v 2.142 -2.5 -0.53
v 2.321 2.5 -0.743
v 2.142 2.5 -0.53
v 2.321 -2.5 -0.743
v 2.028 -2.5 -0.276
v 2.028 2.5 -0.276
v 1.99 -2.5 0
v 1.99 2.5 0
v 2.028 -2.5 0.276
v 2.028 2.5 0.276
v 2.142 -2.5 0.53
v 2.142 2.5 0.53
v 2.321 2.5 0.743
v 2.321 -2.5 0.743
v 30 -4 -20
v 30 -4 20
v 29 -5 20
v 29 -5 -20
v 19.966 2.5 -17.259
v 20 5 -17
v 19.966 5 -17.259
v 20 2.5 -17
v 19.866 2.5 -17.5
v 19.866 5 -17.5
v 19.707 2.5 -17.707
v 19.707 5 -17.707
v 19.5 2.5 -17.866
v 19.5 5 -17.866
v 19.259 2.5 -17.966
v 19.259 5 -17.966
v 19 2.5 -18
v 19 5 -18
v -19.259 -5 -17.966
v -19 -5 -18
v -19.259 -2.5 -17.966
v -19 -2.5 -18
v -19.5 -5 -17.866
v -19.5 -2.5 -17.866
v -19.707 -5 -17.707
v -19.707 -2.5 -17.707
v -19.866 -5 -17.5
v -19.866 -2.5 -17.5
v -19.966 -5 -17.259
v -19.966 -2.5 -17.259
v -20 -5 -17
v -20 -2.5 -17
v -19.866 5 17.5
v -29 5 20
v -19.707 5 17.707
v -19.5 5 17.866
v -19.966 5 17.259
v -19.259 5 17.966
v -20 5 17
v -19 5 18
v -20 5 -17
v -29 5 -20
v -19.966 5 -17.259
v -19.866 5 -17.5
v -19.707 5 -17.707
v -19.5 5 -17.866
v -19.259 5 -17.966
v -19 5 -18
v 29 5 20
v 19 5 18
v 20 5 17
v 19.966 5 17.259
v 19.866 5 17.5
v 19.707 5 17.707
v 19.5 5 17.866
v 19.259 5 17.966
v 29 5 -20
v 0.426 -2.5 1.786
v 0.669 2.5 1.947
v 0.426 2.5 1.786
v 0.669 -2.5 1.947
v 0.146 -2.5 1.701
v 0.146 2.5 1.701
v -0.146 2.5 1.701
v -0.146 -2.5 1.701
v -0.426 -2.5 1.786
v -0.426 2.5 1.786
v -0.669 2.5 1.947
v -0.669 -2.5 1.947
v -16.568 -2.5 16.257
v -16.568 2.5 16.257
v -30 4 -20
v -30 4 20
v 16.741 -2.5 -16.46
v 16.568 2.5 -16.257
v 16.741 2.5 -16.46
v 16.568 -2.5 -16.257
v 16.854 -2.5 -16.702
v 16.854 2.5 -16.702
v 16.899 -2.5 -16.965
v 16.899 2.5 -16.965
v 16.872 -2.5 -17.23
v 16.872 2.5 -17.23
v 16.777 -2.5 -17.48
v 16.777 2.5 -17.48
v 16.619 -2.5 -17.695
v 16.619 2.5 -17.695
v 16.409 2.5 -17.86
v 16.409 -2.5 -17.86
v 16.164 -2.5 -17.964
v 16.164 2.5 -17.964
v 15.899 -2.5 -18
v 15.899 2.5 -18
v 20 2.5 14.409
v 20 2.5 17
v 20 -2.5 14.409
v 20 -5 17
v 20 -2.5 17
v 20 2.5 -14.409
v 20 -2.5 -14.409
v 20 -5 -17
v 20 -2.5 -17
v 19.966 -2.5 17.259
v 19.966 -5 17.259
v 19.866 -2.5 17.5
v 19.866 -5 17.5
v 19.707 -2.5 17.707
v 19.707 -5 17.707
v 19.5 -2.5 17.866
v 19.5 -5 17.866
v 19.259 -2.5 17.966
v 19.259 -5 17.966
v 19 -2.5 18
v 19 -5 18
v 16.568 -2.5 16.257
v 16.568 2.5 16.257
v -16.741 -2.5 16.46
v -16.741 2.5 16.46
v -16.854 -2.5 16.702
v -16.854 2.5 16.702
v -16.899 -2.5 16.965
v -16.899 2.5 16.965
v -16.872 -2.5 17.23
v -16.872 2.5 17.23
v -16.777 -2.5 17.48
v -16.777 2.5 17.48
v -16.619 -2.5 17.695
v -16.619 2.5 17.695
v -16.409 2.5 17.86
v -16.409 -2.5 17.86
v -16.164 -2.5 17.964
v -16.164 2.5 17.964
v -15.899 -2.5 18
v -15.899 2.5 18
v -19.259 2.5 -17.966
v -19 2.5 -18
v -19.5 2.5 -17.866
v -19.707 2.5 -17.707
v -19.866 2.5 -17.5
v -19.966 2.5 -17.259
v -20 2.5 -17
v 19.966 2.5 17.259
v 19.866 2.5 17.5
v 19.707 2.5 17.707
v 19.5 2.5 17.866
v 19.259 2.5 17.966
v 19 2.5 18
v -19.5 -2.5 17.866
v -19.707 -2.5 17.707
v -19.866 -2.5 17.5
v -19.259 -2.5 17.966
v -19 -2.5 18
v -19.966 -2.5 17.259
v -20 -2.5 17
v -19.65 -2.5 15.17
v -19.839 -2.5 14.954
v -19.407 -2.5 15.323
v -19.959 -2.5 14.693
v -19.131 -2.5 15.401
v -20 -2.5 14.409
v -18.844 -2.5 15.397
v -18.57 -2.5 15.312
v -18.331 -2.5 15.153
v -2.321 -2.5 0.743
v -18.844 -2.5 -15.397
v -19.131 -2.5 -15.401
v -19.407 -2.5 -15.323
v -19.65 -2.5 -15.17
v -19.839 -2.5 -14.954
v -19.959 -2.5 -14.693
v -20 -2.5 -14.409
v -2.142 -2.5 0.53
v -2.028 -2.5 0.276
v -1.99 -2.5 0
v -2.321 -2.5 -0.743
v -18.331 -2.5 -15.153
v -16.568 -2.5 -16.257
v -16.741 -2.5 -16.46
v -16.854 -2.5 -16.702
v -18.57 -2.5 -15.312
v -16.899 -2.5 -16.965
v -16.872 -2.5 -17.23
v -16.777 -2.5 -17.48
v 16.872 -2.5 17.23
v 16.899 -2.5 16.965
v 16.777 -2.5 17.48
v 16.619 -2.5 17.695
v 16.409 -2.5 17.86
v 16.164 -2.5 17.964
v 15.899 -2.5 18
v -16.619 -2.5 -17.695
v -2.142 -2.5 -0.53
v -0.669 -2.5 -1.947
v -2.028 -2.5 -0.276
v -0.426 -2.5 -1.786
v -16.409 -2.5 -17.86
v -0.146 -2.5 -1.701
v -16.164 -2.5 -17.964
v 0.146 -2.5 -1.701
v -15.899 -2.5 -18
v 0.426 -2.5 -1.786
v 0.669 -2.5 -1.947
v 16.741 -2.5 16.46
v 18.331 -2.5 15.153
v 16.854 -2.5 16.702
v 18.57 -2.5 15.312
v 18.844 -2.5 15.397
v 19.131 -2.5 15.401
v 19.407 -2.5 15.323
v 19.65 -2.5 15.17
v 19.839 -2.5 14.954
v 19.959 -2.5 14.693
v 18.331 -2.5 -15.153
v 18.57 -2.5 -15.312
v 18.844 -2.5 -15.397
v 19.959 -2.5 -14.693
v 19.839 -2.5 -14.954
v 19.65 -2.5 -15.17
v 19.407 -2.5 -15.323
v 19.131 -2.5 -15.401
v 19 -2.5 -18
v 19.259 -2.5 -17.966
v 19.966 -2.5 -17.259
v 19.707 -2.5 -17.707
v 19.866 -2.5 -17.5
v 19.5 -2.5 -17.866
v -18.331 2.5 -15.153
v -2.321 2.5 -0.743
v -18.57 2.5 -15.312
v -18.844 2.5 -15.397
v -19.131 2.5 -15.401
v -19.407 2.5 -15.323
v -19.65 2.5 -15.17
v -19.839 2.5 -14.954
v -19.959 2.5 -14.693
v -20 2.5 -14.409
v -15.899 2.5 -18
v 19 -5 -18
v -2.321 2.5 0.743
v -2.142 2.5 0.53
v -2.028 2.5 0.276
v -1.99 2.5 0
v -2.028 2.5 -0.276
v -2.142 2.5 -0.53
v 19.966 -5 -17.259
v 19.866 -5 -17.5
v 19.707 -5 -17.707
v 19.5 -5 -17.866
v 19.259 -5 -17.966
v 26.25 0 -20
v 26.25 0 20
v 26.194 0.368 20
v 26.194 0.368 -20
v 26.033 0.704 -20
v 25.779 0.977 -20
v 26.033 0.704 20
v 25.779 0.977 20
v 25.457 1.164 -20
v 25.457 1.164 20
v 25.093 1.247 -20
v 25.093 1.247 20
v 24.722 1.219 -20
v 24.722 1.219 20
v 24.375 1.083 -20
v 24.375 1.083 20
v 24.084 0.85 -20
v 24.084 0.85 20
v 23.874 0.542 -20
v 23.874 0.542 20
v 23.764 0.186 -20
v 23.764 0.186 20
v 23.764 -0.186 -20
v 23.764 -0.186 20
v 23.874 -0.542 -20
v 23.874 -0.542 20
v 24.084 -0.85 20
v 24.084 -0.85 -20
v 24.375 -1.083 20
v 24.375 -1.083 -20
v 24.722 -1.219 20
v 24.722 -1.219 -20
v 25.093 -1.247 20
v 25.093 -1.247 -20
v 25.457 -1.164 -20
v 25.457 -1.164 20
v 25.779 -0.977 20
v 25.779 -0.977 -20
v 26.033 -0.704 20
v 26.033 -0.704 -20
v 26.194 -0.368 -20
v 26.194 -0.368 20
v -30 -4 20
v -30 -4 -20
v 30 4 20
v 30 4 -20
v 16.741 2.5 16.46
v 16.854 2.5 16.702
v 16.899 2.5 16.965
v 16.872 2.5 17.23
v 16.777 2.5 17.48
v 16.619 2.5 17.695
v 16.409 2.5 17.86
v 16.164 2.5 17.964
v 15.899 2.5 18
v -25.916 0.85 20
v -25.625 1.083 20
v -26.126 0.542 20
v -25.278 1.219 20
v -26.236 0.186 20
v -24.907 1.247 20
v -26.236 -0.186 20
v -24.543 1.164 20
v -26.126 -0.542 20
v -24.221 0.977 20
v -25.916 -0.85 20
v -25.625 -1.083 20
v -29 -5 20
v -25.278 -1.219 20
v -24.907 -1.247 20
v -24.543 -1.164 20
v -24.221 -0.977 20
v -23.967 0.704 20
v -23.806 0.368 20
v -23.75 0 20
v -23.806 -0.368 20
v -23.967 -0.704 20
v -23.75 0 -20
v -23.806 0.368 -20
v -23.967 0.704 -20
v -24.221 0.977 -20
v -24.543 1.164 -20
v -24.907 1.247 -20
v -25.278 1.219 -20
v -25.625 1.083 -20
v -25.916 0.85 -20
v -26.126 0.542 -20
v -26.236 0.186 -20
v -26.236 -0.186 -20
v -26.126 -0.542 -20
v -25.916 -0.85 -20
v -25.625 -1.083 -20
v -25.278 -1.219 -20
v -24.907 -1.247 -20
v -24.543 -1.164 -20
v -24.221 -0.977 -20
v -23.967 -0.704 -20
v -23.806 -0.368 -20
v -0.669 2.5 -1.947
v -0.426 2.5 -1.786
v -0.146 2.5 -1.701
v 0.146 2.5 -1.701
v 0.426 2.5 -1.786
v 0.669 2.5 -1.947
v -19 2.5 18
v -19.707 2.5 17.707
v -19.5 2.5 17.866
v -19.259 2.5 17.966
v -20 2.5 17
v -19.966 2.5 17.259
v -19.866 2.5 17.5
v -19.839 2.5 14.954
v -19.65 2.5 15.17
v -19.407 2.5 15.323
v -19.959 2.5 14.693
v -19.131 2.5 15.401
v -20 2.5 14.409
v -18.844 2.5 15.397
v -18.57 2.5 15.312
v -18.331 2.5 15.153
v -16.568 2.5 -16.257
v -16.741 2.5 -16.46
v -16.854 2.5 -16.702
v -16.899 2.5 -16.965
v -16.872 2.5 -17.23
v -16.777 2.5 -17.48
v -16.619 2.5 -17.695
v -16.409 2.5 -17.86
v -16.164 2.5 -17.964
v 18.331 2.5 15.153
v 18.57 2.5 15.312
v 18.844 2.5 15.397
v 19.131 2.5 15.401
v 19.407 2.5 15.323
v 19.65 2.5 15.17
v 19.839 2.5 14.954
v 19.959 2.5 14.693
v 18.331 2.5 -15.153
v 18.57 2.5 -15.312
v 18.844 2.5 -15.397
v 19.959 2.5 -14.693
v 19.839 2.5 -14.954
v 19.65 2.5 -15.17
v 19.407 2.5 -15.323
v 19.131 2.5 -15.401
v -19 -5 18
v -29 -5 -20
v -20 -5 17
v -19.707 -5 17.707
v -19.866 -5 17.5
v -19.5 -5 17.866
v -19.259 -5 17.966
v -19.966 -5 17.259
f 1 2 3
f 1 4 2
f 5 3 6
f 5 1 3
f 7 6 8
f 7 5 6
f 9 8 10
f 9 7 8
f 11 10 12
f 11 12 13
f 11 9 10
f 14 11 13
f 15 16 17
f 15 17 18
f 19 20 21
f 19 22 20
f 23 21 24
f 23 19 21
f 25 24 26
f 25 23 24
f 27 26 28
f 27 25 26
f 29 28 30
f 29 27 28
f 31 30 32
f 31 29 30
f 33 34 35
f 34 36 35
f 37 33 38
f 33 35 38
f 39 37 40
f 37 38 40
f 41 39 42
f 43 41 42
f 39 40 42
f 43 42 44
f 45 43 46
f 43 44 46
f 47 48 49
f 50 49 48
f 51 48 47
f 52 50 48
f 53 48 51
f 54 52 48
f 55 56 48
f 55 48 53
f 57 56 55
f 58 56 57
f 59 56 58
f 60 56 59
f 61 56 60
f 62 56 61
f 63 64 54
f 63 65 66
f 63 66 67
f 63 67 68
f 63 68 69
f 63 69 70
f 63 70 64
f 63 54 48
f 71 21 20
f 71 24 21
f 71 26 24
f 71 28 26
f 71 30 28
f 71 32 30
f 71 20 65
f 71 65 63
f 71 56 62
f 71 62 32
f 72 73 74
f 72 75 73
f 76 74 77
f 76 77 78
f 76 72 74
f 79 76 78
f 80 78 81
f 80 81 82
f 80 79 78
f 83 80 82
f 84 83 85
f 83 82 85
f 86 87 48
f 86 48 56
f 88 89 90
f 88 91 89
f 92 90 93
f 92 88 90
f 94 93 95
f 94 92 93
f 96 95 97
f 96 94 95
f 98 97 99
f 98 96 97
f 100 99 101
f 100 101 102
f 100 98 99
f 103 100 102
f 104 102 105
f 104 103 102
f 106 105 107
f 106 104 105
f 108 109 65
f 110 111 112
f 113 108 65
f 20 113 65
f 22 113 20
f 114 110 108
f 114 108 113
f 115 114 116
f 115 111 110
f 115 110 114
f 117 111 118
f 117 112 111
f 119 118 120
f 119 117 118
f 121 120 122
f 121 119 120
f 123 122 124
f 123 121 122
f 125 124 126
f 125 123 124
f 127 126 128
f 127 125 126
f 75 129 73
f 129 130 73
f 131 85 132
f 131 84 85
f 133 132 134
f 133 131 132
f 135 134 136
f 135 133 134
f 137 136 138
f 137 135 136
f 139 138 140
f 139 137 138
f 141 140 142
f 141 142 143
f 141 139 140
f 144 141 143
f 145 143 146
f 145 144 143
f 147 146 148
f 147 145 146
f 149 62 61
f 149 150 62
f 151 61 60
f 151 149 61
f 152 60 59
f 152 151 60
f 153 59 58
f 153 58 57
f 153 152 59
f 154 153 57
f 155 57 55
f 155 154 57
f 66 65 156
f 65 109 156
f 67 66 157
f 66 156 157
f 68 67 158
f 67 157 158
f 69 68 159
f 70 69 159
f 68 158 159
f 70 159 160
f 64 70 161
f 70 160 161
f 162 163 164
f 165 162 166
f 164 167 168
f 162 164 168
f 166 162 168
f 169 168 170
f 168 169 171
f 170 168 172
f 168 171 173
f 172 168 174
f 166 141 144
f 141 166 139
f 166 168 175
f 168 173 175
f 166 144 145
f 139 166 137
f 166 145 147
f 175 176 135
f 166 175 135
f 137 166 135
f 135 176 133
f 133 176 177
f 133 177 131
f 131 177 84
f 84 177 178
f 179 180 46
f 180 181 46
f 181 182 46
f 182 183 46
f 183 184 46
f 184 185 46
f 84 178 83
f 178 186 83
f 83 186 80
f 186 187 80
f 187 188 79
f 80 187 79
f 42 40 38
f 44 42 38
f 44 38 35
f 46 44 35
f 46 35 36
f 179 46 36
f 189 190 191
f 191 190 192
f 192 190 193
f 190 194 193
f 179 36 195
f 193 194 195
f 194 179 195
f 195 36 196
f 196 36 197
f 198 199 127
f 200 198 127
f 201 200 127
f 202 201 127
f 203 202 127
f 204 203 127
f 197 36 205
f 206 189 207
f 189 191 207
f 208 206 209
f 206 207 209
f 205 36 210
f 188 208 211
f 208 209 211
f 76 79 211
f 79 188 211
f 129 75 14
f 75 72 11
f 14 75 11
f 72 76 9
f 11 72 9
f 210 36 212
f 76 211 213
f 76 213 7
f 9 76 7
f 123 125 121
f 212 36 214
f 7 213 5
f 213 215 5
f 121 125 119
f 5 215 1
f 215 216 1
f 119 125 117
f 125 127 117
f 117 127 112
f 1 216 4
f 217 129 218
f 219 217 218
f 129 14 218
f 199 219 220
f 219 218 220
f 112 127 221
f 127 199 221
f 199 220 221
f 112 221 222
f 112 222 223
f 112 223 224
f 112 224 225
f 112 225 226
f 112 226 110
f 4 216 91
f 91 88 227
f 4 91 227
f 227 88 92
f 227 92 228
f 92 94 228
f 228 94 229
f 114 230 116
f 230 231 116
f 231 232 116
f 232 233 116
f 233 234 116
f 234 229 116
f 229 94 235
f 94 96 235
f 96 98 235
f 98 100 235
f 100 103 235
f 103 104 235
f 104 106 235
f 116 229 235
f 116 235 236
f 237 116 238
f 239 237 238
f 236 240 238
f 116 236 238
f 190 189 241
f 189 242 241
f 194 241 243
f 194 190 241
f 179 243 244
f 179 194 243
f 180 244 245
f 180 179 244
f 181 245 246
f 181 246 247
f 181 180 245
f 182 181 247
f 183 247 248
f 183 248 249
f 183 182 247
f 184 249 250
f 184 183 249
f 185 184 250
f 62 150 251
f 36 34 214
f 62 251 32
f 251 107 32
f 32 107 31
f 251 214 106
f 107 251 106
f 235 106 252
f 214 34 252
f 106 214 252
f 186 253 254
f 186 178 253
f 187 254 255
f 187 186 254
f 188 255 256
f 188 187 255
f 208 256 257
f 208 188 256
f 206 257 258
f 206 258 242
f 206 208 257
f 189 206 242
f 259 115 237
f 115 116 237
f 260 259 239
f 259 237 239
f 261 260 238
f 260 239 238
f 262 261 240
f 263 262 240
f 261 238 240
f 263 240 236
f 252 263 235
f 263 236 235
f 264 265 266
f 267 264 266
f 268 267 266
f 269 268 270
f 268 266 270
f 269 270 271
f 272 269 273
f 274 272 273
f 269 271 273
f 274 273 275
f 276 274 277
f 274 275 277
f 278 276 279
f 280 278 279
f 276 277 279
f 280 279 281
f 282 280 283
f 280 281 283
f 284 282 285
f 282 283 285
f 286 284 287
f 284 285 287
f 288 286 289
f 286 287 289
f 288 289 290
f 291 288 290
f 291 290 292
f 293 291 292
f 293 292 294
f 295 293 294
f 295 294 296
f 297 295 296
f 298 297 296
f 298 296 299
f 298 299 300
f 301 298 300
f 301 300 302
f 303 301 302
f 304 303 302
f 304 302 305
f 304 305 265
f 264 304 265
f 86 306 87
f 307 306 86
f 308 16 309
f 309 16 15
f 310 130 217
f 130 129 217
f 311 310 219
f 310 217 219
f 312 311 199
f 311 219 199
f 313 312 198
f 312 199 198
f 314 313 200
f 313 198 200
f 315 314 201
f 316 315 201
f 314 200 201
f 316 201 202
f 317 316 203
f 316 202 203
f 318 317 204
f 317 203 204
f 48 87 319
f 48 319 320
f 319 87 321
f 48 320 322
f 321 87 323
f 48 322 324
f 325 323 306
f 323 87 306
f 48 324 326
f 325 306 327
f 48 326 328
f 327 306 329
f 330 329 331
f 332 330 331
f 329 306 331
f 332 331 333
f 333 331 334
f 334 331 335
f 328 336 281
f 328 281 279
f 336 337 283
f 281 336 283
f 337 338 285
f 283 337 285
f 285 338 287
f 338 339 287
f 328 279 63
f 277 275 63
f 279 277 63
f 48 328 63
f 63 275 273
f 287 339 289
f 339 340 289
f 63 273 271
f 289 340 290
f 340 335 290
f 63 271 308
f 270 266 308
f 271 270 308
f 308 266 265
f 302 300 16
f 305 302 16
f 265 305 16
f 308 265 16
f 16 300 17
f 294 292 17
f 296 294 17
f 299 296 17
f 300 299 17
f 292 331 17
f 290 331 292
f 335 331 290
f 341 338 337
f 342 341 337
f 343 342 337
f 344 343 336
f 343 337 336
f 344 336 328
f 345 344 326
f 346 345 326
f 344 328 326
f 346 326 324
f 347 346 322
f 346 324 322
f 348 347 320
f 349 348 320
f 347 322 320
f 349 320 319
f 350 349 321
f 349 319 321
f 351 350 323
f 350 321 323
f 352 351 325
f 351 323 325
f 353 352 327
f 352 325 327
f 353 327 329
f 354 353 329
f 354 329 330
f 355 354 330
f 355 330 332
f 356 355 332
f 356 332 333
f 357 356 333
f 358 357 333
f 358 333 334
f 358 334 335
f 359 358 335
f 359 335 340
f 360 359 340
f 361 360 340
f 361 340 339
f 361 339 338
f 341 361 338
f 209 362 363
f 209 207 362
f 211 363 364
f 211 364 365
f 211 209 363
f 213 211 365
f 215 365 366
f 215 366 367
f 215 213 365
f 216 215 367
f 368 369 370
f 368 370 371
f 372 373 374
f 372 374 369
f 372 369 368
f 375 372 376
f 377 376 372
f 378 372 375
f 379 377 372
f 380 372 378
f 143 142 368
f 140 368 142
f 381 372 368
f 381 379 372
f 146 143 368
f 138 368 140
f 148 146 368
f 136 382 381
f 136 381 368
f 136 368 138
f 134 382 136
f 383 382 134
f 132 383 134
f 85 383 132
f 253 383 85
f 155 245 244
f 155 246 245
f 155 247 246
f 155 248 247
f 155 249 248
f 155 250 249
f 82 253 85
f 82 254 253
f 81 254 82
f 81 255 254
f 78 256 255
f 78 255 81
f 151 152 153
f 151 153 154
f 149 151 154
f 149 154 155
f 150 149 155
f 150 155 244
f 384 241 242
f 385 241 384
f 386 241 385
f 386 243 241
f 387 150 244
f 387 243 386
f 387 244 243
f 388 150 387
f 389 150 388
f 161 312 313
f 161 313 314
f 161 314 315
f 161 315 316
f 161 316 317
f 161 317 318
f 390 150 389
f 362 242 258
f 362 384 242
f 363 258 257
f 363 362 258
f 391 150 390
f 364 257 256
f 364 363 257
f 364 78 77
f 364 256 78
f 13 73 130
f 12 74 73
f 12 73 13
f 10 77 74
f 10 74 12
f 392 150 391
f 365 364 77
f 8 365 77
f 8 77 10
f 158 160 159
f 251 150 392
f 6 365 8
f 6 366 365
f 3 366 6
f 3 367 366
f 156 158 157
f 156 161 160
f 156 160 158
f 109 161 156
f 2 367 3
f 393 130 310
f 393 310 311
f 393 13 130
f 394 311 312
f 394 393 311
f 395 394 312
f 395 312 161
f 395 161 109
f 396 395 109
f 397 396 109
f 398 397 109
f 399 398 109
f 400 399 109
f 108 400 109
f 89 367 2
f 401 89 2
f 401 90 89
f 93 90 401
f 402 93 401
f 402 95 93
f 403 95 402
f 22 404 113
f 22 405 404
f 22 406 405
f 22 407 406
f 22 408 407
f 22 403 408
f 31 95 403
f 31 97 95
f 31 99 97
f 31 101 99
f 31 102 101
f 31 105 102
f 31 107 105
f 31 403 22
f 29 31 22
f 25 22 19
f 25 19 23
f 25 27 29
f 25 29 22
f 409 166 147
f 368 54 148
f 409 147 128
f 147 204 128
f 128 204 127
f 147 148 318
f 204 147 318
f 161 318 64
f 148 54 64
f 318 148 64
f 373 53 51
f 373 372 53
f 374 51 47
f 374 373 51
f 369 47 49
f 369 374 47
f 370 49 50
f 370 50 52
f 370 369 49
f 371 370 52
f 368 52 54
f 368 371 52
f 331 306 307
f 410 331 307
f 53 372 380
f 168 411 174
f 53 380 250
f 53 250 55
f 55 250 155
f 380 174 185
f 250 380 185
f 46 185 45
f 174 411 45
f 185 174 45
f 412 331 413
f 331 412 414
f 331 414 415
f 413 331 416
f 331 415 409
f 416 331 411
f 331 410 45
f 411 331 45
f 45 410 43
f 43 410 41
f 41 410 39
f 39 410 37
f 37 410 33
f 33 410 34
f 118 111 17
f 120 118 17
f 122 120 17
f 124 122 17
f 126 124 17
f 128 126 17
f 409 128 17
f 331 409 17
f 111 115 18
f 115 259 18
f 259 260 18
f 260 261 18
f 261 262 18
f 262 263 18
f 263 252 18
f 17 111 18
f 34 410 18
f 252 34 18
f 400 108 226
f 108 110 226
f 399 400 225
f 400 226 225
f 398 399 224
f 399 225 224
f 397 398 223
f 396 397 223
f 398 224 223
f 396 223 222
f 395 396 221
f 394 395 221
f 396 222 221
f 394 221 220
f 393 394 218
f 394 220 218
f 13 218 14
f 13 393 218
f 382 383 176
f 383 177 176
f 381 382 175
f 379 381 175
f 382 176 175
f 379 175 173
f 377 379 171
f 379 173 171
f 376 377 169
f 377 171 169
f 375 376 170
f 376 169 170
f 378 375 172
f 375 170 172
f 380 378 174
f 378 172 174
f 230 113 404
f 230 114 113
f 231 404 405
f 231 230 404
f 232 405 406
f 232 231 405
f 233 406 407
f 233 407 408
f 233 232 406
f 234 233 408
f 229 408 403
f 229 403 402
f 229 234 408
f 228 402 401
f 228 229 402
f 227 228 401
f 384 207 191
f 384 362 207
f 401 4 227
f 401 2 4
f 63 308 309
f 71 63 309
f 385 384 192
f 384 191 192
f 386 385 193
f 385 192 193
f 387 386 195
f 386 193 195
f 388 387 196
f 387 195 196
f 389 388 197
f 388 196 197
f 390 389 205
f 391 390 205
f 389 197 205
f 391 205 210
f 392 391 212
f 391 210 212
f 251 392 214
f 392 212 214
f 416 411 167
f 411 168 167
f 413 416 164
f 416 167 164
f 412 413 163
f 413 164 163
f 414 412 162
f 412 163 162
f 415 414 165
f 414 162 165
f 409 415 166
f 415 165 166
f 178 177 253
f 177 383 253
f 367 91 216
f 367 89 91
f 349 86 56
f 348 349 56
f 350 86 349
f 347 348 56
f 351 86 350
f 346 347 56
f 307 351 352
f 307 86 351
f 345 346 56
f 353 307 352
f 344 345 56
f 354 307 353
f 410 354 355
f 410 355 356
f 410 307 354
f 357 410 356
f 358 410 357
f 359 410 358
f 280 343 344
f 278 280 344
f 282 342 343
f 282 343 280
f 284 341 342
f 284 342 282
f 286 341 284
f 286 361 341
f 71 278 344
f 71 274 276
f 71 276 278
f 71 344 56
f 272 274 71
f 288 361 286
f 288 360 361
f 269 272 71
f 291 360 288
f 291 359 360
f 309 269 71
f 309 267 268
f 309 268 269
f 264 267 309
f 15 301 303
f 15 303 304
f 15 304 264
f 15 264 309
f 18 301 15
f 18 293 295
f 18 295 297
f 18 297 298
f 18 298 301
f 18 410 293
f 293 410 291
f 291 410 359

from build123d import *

# Parameters (mm, degrees)
EXTRUDE_428_DEPTH      = 5
EXTRUDE_428_DEPTH_BACK = 5
SKETCH_1_W             = 60
SKETCH_1_H             = 40
SKETCH_5_R             = 1.25
CUT_EXTRUDE_682_DEPTH  = 51.249378106
CUT_EXTRUDE_1222_DEPTH = 38.416573868
SKETCH_7_W             = 40
SKETCH_7_H             = 36
CUT_EXTRUDE_1460_DEPTH = 2.5
FILLET_1_R             = 1
FILLET_2_R             = 1
CHAMFER_1_SIZE         = 1


with BuildPart() as part:
    # Эскиз1 → Extrude 428 (new, two sides: drawn at the far end of the back side and taken through both)
    with BuildSketch(Plane(origin=(0, 0, 0), x_dir=(1, 0, 0), z_dir=(0, 1, 0)).offset(-EXTRUDE_428_DEPTH_BACK)):
        Rectangle(SKETCH_1_W, SKETCH_1_H)
    extrude(amount=EXTRUDE_428_DEPTH + EXTRUDE_428_DEPTH_BACK)

    # Эскиз5 → Cut-Extrude 682 (cut, through all)
    with BuildSketch(Plane.XY.offset(20)):
        with Locations((-25, 0)):
            Circle(SKETCH_5_R)
        with Locations((25, 0)):
            Circle(SKETCH_5_R)
    extrude(amount=-CUT_EXTRUDE_682_DEPTH, mode=Mode.SUBTRACT)

    # Эскиз6 → Cut-Extrude 1222 (cut, through all)
    with BuildSketch(Plane(origin=(0, 5, 0), x_dir=(1, 0, 0), z_dir=(0, 1, 0))):
        Polygon((-18.505152884, 18), (18.505152884, 18), (0, 1.345362405), align=None)
        Polygon((20, 16.654637595), (20, -16.654637595), (1.494847116, 0), align=None)
        Polygon((-18.505152884, -18), (18.505152884, -18), (0, -1.345362405), align=None)
        Polygon((-20, 16.654637595), (-20, -16.654637595), (-1.494847116, 0), align=None)
    extrude(amount=-CUT_EXTRUDE_1222_DEPTH, mode=Mode.SUBTRACT)

    # Эскиз7 → Cut-Extrude 1460 (cut)
    with BuildSketch(Plane(origin=(0, 5, 0), x_dir=(1, 0, 0), z_dir=(0, 1, 0))):
        Rectangle(SKETCH_7_W, SKETCH_7_H)
    cut_extrude_1460 = extrude(amount=-CUT_EXTRUDE_1460_DEPTH, mode=Mode.SUBTRACT)

    # Зеркальное отражение1: Cut-Extrude 1460 across plane
    add(cut_extrude_1460.mirror(Plane.ZX), mode=Mode.SUBTRACT)

    # Скругление1
    fillet_1_edges = [part.edges().sort_by_distance(p)[0] for p in [
        (18.505152884, 0, 18),
        (-18.505152884, 0, 18),
        (-20, 0, 16.654637595),
        (-20, 0, -16.654637595),
        (-18.505152884, 0, -18),
        (18.505152884, 0, -18),
        (20, 0, -16.654637595),
        (20, 0, 16.654637595),
        (-20, -3.75, -18),
        (-20, -3.75, 18),
        (20, -3.75, 18),
        (20, -3.75, -18),
        (20, 3.75, -18),
        (-20, 3.75, -18),
        (-20, 3.75, 18),
        (20, 3.75, 18),
    ]]
    fillet(fillet_1_edges, radius=FILLET_1_R)

    # Скругление2
    fillet_2_edges = [part.edges().sort_by_distance(p)[0] for p in [
        (0, 0, 1.345362405),
        (-1.494847116, 0, 0),
        (0, 0, -1.345362405),
        (1.494847116, 0, 0),
    ]]
    fillet(fillet_2_edges, radius=FILLET_2_R)

    # Фаска1
    chamfer_1_edges = [part.edges().sort_by_distance(p)[0] for p in [
        (30, -5, 0),
        (-30, 5, 0),
        (30, 5, 0),
        (-30, -5, 0),
    ]]
    chamfer(chamfer_1_edges, length=CHAMFER_1_SIZE)


solid = part.part
